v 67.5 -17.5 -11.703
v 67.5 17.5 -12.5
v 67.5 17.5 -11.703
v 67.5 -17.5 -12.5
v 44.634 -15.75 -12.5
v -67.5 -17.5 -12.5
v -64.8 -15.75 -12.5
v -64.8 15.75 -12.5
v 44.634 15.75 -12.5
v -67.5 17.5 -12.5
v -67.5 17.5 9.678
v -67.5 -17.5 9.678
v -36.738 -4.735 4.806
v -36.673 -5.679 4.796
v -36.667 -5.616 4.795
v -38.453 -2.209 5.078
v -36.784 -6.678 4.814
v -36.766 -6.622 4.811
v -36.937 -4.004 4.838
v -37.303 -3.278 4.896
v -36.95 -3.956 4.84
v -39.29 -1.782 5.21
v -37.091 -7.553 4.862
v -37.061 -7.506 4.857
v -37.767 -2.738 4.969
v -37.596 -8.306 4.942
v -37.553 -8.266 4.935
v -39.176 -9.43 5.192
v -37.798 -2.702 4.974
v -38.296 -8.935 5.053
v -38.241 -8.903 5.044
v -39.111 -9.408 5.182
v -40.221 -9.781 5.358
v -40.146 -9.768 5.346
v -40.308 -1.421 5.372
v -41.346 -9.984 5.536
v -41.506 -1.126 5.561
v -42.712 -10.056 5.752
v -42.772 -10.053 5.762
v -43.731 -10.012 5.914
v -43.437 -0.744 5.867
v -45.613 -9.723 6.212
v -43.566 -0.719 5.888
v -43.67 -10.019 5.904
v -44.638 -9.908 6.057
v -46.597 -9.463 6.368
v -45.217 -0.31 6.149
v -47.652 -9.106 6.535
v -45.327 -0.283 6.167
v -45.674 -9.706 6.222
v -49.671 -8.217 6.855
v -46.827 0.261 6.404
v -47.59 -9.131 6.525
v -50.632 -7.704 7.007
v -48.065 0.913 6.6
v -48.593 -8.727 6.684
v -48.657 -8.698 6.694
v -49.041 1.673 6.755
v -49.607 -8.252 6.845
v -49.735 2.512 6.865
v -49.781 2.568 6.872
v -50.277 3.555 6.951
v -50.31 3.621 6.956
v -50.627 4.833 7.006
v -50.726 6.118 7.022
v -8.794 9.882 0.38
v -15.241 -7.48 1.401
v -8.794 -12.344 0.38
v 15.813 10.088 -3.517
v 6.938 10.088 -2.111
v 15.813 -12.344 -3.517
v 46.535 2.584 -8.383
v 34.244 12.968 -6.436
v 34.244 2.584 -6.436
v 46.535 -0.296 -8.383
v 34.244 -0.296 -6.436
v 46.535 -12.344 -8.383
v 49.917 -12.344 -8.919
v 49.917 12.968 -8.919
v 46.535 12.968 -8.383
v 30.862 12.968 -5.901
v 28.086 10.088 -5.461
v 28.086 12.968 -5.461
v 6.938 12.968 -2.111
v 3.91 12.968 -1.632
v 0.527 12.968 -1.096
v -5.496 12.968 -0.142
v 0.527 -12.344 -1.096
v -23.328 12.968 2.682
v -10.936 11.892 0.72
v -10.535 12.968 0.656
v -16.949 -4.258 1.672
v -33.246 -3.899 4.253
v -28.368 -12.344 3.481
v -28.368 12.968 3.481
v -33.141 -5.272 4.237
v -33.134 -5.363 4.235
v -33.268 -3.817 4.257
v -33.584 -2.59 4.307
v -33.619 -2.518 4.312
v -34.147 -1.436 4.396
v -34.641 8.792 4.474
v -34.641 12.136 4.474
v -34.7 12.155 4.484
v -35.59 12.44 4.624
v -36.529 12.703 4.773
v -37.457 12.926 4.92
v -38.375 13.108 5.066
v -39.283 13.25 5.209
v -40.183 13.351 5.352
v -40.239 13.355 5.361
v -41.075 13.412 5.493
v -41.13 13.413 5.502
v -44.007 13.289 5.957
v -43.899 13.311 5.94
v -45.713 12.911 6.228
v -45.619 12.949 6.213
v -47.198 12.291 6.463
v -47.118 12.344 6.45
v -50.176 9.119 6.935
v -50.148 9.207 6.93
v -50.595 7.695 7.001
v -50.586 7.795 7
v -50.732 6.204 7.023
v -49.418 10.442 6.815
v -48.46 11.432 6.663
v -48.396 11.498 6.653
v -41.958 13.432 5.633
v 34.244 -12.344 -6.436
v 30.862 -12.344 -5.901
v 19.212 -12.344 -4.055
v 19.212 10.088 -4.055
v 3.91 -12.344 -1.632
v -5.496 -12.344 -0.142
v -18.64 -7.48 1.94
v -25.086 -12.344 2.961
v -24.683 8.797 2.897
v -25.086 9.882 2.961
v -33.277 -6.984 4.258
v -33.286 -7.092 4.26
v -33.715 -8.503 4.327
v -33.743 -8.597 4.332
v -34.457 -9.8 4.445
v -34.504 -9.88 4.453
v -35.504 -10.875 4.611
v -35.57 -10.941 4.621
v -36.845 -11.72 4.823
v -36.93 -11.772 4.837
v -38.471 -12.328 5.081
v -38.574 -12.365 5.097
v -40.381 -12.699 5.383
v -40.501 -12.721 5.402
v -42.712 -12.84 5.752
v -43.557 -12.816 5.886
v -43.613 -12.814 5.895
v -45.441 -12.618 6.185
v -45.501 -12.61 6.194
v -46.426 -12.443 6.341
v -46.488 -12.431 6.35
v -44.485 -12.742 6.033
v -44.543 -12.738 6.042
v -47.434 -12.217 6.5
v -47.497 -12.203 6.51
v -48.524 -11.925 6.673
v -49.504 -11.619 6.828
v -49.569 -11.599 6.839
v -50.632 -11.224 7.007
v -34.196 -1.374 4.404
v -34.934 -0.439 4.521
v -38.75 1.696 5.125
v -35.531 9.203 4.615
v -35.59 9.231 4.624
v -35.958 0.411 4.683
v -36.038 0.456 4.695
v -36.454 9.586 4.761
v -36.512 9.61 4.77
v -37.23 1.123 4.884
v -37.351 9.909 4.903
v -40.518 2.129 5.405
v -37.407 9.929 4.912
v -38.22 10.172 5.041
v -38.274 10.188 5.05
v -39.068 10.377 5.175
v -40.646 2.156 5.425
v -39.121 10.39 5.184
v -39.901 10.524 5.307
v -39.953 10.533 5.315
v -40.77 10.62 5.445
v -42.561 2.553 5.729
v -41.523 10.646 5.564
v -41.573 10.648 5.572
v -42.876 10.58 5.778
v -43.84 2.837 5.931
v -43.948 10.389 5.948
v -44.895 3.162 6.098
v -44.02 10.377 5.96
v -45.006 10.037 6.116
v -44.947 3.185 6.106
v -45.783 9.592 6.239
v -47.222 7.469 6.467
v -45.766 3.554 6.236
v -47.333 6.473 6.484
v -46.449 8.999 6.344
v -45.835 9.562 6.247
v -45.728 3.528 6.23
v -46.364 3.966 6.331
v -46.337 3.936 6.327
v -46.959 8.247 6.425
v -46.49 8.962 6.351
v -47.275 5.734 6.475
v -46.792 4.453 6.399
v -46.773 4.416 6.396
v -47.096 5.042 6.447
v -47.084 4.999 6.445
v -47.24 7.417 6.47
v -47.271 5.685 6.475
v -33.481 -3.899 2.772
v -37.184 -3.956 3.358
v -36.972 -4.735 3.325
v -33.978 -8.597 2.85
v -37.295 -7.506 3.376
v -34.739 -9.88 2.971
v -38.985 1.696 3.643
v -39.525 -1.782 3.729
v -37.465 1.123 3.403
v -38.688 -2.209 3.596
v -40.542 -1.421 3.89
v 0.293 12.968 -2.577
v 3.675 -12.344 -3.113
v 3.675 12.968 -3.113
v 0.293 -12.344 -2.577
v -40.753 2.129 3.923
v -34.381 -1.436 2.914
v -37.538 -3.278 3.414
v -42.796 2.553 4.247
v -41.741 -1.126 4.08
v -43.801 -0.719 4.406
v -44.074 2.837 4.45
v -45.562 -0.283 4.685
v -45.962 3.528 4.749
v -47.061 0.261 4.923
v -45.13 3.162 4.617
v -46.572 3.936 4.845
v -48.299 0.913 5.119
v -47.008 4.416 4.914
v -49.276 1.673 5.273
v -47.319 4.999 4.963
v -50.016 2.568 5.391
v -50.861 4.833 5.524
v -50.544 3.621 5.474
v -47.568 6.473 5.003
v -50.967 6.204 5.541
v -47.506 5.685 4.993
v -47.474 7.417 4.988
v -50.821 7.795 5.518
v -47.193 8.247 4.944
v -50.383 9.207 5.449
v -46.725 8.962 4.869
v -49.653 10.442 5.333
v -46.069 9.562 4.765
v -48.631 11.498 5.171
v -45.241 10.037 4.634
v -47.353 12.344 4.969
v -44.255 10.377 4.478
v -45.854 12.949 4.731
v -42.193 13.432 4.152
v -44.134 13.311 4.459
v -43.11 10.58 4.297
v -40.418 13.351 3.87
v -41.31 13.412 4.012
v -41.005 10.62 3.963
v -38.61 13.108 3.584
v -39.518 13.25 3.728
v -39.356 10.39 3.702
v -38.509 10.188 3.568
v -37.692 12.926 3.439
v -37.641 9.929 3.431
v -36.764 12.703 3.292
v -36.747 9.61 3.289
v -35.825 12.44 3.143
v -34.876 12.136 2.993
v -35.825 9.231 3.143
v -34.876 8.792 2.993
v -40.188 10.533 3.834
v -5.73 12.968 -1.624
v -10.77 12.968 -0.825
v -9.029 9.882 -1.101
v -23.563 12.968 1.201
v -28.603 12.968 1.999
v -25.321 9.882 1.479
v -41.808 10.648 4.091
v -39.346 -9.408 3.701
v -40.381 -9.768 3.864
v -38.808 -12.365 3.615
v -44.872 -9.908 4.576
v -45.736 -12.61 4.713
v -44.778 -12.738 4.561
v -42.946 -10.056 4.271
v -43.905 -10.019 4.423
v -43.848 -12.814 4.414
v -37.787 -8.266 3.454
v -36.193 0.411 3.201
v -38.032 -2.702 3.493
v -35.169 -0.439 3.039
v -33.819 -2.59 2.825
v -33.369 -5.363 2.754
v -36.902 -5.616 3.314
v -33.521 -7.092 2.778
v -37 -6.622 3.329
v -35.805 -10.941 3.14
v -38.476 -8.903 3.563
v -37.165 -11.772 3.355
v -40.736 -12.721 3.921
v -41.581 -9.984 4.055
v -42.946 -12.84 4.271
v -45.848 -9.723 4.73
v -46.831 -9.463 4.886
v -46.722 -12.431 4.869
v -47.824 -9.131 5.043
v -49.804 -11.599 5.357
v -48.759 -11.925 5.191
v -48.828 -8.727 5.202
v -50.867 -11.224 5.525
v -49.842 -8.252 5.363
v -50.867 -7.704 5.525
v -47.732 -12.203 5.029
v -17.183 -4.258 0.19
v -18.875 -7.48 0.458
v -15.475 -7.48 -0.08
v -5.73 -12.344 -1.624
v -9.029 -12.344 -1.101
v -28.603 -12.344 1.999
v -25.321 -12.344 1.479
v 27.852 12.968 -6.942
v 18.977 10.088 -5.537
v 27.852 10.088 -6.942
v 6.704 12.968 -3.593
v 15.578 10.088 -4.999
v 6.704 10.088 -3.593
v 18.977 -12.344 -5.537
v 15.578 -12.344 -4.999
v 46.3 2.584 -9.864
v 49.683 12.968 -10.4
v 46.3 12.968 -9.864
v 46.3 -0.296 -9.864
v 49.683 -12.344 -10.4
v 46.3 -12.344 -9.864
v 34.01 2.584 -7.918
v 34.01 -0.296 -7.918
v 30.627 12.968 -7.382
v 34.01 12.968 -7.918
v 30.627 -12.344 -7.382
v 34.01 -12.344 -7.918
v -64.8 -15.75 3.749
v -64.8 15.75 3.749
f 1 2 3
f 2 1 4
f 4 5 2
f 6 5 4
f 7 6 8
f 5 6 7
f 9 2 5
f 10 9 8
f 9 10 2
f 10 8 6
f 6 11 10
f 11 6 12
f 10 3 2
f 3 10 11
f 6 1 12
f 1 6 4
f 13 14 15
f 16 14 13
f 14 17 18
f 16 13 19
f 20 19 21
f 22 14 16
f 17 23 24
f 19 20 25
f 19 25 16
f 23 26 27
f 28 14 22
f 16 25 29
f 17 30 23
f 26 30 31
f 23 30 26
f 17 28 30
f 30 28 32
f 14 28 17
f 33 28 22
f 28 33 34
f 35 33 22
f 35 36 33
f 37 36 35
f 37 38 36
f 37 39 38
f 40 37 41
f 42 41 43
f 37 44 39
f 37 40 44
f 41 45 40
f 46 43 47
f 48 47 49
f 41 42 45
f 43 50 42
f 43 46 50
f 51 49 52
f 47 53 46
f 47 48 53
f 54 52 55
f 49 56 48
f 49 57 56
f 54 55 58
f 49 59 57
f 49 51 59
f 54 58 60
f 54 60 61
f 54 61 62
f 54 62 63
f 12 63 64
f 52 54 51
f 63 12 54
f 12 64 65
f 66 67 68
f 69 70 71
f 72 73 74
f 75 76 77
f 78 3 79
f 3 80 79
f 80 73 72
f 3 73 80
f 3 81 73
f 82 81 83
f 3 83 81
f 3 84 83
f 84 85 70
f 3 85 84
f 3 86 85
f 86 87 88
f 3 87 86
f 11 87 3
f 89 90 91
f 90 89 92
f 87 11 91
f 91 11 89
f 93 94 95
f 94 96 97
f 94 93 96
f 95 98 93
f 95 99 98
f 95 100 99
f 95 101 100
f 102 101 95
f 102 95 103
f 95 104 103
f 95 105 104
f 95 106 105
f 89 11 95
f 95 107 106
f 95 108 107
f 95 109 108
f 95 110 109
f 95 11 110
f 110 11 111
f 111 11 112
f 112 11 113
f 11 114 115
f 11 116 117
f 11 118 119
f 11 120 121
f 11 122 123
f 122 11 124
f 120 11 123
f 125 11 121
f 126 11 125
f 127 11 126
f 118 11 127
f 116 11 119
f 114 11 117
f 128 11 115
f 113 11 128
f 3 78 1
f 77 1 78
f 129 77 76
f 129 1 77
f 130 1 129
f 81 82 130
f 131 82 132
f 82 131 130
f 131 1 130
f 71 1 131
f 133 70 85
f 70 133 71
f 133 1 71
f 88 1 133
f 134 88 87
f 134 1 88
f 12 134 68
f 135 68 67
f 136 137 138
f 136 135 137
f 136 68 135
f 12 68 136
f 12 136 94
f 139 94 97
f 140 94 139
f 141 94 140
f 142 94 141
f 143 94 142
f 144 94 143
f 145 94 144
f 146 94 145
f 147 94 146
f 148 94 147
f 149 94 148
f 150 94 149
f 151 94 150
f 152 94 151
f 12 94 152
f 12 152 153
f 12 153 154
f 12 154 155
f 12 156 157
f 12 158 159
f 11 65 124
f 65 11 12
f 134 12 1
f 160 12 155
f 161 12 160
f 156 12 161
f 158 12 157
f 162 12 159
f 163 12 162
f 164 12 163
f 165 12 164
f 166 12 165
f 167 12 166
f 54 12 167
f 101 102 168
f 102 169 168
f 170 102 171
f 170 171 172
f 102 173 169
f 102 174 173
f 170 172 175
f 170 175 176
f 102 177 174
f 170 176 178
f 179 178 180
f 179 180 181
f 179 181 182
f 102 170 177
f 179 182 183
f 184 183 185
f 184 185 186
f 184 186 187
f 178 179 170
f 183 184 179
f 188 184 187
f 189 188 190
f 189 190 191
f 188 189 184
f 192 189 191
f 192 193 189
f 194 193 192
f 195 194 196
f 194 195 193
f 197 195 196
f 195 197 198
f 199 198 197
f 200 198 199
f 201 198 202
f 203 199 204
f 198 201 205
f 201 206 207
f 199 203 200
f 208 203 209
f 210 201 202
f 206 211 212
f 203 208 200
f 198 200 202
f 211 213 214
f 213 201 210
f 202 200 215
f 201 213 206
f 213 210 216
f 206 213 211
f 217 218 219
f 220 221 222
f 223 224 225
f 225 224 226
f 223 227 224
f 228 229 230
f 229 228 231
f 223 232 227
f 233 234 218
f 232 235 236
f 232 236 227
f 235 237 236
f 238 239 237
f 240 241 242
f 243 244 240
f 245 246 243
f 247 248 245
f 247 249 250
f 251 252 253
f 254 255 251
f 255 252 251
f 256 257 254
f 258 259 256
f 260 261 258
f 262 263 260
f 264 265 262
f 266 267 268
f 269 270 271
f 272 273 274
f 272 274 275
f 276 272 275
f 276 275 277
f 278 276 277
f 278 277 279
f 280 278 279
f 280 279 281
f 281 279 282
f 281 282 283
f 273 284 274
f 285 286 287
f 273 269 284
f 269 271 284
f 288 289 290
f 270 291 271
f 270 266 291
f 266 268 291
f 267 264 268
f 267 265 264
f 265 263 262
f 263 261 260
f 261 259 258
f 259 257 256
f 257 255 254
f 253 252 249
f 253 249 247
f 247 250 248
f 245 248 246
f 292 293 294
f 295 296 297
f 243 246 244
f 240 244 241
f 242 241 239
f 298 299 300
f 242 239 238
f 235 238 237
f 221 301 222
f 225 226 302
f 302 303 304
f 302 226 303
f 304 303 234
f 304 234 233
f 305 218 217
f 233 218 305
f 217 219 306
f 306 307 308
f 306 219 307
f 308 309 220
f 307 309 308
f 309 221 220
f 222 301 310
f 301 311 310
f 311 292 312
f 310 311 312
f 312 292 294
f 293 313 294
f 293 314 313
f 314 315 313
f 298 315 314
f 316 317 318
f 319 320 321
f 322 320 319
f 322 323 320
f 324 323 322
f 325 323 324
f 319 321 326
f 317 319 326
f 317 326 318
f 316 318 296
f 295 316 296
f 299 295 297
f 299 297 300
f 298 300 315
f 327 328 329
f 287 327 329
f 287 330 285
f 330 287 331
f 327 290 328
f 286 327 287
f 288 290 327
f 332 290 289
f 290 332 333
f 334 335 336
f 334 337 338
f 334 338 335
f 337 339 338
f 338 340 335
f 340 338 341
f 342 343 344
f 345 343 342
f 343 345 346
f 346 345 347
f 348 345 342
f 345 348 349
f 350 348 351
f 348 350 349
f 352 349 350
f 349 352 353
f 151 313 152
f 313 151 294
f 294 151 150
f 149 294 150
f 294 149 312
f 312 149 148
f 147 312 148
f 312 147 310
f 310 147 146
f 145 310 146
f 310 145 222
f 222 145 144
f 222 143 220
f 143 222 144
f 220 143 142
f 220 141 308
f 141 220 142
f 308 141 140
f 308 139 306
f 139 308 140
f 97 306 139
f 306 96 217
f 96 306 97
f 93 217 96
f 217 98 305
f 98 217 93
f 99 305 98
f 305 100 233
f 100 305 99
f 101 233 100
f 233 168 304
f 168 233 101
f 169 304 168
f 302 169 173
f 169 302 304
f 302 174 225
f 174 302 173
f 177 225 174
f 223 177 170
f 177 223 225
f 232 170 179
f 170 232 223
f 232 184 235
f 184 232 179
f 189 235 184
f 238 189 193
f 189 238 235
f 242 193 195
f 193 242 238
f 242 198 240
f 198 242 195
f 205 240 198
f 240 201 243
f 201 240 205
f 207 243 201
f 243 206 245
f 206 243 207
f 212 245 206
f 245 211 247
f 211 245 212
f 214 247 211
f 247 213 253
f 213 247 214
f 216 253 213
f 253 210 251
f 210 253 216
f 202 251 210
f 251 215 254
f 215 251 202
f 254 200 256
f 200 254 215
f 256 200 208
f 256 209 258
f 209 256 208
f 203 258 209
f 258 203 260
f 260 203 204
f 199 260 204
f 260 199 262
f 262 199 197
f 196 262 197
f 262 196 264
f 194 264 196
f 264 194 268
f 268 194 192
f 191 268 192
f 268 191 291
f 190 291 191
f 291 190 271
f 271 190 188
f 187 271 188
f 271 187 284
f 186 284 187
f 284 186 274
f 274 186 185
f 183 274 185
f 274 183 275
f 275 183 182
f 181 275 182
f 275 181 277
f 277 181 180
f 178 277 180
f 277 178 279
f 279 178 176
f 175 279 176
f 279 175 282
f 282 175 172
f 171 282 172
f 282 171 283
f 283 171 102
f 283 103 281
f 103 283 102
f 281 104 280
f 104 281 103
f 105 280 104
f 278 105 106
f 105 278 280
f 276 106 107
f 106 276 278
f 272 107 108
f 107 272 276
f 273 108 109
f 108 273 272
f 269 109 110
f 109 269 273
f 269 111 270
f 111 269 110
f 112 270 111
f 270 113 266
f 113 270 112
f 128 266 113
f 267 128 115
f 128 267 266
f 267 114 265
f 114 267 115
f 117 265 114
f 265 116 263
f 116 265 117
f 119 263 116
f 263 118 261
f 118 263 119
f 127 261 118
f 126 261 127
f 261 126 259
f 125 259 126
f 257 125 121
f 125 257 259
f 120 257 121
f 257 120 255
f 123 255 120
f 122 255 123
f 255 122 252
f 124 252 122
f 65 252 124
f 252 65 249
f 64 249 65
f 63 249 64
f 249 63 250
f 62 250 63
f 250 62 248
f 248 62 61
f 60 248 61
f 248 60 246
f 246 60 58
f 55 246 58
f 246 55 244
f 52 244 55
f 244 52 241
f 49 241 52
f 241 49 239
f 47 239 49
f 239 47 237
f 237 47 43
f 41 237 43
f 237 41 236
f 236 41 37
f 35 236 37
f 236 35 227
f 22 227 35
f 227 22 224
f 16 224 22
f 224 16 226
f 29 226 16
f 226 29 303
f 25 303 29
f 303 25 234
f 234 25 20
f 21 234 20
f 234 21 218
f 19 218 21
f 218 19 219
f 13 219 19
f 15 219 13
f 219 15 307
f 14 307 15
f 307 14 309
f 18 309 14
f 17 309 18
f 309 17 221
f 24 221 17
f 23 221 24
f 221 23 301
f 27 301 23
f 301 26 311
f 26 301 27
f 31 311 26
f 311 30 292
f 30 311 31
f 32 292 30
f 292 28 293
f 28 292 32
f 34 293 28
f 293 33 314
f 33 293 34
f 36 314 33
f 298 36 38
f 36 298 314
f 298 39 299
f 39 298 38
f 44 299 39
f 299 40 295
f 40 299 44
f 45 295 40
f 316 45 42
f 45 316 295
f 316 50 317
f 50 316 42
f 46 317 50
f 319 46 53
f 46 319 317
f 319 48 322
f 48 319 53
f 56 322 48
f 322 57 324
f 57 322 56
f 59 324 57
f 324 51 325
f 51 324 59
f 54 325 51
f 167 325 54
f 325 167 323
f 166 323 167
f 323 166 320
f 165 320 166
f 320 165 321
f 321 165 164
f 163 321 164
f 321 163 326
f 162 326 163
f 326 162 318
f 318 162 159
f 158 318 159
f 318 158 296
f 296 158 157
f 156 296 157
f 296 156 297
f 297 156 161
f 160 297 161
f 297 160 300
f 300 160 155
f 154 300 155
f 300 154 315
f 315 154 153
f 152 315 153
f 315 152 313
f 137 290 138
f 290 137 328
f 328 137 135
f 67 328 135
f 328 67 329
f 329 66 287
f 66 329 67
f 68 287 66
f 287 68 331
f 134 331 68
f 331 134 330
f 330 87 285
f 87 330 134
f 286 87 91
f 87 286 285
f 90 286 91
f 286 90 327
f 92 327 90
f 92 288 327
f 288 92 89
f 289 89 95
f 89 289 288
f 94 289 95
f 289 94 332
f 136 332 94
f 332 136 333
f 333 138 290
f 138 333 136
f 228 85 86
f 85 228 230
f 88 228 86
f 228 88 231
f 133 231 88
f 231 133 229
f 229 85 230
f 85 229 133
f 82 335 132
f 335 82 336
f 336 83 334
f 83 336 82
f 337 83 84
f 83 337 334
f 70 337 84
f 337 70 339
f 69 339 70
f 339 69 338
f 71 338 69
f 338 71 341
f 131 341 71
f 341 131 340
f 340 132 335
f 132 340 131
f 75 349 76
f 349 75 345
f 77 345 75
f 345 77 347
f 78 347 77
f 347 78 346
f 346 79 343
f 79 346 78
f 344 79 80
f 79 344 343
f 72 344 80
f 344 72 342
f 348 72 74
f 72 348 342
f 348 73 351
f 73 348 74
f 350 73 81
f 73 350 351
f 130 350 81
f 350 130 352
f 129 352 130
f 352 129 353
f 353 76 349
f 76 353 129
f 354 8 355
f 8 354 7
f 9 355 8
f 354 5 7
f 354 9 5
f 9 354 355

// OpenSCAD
text = "SMITH";
font = "Arial Black"; // [Arial, Baloo Paaji, Candal, Cinzel, Londrina Outline,Roboto]
// Default: 9
angle = 9; // [5:45]
// Default: 135
length = 135; // [0:1000]
// Default: 35
width = 35; // [0:1000]
// Default: 25
height = 25; // [0:1000]
// Default: 1.8
text_height = 1.6; // [0:0.1:100]
// Default: 25
text_size = 25; // [0:1000]
// Default: 0.1
wall_thickness = 0.1; // [0:0.1:1]
// ignore this variable!
thickness = 1-wall_thickness;
// Innie or Outie (text)
outie = "Innie"; // [Outie, Innie]

if (outie=="Outie") {
    //outie
    difference(){
        union() {
            difference(){
                cube([length,width,height],center=true);
                rotate([0,angle,0]) translate([0,0,(height/2)-1]) cube([length*2,width*2,height],center=true);
            }
            
            rotate([0,angle,0]) translate([0,0,-2]) linear_extrude(height=text_height) {
                text(text=text,font=font,size=text_size,halign="center",valign="center");
            }
        }
        
        //bottom
        scale([thickness+.06,thickness,thickness]) translate([0,0,-4.5]) difference(){
                cube([length,width,height],center=true);
                rotate([0,angle,0]) translate([0,0,(height/2)-2]) cube([length*2,width*2,height],center=true);
        }
    }
} else {
//innie
    difference(){
        difference() {
            difference(){
                cube([length,width,height],center=true);
                rotate([0,angle,0]) translate([0,0,(height/2)-1]) cube([length*2,width*2,height],center=true);
            }
            
            rotate([0,angle,0]) translate([0,0,-(0.9+text_height)]) linear_extrude(height=text_height) {
                text(text=text,font=font,size=text_size,halign="center",valign="center");
            }
        }
        
        //bottom
        scale([thickness+.06,thickness,thickness]) translate([0,0,-4.5]) difference(){
                cube([length,width,height],center=true);
                rotate([0,angle,0]) translate([0,0,(height/2)-2]) cube([length*2,width*2,height],center=true);
        }
    }
}
